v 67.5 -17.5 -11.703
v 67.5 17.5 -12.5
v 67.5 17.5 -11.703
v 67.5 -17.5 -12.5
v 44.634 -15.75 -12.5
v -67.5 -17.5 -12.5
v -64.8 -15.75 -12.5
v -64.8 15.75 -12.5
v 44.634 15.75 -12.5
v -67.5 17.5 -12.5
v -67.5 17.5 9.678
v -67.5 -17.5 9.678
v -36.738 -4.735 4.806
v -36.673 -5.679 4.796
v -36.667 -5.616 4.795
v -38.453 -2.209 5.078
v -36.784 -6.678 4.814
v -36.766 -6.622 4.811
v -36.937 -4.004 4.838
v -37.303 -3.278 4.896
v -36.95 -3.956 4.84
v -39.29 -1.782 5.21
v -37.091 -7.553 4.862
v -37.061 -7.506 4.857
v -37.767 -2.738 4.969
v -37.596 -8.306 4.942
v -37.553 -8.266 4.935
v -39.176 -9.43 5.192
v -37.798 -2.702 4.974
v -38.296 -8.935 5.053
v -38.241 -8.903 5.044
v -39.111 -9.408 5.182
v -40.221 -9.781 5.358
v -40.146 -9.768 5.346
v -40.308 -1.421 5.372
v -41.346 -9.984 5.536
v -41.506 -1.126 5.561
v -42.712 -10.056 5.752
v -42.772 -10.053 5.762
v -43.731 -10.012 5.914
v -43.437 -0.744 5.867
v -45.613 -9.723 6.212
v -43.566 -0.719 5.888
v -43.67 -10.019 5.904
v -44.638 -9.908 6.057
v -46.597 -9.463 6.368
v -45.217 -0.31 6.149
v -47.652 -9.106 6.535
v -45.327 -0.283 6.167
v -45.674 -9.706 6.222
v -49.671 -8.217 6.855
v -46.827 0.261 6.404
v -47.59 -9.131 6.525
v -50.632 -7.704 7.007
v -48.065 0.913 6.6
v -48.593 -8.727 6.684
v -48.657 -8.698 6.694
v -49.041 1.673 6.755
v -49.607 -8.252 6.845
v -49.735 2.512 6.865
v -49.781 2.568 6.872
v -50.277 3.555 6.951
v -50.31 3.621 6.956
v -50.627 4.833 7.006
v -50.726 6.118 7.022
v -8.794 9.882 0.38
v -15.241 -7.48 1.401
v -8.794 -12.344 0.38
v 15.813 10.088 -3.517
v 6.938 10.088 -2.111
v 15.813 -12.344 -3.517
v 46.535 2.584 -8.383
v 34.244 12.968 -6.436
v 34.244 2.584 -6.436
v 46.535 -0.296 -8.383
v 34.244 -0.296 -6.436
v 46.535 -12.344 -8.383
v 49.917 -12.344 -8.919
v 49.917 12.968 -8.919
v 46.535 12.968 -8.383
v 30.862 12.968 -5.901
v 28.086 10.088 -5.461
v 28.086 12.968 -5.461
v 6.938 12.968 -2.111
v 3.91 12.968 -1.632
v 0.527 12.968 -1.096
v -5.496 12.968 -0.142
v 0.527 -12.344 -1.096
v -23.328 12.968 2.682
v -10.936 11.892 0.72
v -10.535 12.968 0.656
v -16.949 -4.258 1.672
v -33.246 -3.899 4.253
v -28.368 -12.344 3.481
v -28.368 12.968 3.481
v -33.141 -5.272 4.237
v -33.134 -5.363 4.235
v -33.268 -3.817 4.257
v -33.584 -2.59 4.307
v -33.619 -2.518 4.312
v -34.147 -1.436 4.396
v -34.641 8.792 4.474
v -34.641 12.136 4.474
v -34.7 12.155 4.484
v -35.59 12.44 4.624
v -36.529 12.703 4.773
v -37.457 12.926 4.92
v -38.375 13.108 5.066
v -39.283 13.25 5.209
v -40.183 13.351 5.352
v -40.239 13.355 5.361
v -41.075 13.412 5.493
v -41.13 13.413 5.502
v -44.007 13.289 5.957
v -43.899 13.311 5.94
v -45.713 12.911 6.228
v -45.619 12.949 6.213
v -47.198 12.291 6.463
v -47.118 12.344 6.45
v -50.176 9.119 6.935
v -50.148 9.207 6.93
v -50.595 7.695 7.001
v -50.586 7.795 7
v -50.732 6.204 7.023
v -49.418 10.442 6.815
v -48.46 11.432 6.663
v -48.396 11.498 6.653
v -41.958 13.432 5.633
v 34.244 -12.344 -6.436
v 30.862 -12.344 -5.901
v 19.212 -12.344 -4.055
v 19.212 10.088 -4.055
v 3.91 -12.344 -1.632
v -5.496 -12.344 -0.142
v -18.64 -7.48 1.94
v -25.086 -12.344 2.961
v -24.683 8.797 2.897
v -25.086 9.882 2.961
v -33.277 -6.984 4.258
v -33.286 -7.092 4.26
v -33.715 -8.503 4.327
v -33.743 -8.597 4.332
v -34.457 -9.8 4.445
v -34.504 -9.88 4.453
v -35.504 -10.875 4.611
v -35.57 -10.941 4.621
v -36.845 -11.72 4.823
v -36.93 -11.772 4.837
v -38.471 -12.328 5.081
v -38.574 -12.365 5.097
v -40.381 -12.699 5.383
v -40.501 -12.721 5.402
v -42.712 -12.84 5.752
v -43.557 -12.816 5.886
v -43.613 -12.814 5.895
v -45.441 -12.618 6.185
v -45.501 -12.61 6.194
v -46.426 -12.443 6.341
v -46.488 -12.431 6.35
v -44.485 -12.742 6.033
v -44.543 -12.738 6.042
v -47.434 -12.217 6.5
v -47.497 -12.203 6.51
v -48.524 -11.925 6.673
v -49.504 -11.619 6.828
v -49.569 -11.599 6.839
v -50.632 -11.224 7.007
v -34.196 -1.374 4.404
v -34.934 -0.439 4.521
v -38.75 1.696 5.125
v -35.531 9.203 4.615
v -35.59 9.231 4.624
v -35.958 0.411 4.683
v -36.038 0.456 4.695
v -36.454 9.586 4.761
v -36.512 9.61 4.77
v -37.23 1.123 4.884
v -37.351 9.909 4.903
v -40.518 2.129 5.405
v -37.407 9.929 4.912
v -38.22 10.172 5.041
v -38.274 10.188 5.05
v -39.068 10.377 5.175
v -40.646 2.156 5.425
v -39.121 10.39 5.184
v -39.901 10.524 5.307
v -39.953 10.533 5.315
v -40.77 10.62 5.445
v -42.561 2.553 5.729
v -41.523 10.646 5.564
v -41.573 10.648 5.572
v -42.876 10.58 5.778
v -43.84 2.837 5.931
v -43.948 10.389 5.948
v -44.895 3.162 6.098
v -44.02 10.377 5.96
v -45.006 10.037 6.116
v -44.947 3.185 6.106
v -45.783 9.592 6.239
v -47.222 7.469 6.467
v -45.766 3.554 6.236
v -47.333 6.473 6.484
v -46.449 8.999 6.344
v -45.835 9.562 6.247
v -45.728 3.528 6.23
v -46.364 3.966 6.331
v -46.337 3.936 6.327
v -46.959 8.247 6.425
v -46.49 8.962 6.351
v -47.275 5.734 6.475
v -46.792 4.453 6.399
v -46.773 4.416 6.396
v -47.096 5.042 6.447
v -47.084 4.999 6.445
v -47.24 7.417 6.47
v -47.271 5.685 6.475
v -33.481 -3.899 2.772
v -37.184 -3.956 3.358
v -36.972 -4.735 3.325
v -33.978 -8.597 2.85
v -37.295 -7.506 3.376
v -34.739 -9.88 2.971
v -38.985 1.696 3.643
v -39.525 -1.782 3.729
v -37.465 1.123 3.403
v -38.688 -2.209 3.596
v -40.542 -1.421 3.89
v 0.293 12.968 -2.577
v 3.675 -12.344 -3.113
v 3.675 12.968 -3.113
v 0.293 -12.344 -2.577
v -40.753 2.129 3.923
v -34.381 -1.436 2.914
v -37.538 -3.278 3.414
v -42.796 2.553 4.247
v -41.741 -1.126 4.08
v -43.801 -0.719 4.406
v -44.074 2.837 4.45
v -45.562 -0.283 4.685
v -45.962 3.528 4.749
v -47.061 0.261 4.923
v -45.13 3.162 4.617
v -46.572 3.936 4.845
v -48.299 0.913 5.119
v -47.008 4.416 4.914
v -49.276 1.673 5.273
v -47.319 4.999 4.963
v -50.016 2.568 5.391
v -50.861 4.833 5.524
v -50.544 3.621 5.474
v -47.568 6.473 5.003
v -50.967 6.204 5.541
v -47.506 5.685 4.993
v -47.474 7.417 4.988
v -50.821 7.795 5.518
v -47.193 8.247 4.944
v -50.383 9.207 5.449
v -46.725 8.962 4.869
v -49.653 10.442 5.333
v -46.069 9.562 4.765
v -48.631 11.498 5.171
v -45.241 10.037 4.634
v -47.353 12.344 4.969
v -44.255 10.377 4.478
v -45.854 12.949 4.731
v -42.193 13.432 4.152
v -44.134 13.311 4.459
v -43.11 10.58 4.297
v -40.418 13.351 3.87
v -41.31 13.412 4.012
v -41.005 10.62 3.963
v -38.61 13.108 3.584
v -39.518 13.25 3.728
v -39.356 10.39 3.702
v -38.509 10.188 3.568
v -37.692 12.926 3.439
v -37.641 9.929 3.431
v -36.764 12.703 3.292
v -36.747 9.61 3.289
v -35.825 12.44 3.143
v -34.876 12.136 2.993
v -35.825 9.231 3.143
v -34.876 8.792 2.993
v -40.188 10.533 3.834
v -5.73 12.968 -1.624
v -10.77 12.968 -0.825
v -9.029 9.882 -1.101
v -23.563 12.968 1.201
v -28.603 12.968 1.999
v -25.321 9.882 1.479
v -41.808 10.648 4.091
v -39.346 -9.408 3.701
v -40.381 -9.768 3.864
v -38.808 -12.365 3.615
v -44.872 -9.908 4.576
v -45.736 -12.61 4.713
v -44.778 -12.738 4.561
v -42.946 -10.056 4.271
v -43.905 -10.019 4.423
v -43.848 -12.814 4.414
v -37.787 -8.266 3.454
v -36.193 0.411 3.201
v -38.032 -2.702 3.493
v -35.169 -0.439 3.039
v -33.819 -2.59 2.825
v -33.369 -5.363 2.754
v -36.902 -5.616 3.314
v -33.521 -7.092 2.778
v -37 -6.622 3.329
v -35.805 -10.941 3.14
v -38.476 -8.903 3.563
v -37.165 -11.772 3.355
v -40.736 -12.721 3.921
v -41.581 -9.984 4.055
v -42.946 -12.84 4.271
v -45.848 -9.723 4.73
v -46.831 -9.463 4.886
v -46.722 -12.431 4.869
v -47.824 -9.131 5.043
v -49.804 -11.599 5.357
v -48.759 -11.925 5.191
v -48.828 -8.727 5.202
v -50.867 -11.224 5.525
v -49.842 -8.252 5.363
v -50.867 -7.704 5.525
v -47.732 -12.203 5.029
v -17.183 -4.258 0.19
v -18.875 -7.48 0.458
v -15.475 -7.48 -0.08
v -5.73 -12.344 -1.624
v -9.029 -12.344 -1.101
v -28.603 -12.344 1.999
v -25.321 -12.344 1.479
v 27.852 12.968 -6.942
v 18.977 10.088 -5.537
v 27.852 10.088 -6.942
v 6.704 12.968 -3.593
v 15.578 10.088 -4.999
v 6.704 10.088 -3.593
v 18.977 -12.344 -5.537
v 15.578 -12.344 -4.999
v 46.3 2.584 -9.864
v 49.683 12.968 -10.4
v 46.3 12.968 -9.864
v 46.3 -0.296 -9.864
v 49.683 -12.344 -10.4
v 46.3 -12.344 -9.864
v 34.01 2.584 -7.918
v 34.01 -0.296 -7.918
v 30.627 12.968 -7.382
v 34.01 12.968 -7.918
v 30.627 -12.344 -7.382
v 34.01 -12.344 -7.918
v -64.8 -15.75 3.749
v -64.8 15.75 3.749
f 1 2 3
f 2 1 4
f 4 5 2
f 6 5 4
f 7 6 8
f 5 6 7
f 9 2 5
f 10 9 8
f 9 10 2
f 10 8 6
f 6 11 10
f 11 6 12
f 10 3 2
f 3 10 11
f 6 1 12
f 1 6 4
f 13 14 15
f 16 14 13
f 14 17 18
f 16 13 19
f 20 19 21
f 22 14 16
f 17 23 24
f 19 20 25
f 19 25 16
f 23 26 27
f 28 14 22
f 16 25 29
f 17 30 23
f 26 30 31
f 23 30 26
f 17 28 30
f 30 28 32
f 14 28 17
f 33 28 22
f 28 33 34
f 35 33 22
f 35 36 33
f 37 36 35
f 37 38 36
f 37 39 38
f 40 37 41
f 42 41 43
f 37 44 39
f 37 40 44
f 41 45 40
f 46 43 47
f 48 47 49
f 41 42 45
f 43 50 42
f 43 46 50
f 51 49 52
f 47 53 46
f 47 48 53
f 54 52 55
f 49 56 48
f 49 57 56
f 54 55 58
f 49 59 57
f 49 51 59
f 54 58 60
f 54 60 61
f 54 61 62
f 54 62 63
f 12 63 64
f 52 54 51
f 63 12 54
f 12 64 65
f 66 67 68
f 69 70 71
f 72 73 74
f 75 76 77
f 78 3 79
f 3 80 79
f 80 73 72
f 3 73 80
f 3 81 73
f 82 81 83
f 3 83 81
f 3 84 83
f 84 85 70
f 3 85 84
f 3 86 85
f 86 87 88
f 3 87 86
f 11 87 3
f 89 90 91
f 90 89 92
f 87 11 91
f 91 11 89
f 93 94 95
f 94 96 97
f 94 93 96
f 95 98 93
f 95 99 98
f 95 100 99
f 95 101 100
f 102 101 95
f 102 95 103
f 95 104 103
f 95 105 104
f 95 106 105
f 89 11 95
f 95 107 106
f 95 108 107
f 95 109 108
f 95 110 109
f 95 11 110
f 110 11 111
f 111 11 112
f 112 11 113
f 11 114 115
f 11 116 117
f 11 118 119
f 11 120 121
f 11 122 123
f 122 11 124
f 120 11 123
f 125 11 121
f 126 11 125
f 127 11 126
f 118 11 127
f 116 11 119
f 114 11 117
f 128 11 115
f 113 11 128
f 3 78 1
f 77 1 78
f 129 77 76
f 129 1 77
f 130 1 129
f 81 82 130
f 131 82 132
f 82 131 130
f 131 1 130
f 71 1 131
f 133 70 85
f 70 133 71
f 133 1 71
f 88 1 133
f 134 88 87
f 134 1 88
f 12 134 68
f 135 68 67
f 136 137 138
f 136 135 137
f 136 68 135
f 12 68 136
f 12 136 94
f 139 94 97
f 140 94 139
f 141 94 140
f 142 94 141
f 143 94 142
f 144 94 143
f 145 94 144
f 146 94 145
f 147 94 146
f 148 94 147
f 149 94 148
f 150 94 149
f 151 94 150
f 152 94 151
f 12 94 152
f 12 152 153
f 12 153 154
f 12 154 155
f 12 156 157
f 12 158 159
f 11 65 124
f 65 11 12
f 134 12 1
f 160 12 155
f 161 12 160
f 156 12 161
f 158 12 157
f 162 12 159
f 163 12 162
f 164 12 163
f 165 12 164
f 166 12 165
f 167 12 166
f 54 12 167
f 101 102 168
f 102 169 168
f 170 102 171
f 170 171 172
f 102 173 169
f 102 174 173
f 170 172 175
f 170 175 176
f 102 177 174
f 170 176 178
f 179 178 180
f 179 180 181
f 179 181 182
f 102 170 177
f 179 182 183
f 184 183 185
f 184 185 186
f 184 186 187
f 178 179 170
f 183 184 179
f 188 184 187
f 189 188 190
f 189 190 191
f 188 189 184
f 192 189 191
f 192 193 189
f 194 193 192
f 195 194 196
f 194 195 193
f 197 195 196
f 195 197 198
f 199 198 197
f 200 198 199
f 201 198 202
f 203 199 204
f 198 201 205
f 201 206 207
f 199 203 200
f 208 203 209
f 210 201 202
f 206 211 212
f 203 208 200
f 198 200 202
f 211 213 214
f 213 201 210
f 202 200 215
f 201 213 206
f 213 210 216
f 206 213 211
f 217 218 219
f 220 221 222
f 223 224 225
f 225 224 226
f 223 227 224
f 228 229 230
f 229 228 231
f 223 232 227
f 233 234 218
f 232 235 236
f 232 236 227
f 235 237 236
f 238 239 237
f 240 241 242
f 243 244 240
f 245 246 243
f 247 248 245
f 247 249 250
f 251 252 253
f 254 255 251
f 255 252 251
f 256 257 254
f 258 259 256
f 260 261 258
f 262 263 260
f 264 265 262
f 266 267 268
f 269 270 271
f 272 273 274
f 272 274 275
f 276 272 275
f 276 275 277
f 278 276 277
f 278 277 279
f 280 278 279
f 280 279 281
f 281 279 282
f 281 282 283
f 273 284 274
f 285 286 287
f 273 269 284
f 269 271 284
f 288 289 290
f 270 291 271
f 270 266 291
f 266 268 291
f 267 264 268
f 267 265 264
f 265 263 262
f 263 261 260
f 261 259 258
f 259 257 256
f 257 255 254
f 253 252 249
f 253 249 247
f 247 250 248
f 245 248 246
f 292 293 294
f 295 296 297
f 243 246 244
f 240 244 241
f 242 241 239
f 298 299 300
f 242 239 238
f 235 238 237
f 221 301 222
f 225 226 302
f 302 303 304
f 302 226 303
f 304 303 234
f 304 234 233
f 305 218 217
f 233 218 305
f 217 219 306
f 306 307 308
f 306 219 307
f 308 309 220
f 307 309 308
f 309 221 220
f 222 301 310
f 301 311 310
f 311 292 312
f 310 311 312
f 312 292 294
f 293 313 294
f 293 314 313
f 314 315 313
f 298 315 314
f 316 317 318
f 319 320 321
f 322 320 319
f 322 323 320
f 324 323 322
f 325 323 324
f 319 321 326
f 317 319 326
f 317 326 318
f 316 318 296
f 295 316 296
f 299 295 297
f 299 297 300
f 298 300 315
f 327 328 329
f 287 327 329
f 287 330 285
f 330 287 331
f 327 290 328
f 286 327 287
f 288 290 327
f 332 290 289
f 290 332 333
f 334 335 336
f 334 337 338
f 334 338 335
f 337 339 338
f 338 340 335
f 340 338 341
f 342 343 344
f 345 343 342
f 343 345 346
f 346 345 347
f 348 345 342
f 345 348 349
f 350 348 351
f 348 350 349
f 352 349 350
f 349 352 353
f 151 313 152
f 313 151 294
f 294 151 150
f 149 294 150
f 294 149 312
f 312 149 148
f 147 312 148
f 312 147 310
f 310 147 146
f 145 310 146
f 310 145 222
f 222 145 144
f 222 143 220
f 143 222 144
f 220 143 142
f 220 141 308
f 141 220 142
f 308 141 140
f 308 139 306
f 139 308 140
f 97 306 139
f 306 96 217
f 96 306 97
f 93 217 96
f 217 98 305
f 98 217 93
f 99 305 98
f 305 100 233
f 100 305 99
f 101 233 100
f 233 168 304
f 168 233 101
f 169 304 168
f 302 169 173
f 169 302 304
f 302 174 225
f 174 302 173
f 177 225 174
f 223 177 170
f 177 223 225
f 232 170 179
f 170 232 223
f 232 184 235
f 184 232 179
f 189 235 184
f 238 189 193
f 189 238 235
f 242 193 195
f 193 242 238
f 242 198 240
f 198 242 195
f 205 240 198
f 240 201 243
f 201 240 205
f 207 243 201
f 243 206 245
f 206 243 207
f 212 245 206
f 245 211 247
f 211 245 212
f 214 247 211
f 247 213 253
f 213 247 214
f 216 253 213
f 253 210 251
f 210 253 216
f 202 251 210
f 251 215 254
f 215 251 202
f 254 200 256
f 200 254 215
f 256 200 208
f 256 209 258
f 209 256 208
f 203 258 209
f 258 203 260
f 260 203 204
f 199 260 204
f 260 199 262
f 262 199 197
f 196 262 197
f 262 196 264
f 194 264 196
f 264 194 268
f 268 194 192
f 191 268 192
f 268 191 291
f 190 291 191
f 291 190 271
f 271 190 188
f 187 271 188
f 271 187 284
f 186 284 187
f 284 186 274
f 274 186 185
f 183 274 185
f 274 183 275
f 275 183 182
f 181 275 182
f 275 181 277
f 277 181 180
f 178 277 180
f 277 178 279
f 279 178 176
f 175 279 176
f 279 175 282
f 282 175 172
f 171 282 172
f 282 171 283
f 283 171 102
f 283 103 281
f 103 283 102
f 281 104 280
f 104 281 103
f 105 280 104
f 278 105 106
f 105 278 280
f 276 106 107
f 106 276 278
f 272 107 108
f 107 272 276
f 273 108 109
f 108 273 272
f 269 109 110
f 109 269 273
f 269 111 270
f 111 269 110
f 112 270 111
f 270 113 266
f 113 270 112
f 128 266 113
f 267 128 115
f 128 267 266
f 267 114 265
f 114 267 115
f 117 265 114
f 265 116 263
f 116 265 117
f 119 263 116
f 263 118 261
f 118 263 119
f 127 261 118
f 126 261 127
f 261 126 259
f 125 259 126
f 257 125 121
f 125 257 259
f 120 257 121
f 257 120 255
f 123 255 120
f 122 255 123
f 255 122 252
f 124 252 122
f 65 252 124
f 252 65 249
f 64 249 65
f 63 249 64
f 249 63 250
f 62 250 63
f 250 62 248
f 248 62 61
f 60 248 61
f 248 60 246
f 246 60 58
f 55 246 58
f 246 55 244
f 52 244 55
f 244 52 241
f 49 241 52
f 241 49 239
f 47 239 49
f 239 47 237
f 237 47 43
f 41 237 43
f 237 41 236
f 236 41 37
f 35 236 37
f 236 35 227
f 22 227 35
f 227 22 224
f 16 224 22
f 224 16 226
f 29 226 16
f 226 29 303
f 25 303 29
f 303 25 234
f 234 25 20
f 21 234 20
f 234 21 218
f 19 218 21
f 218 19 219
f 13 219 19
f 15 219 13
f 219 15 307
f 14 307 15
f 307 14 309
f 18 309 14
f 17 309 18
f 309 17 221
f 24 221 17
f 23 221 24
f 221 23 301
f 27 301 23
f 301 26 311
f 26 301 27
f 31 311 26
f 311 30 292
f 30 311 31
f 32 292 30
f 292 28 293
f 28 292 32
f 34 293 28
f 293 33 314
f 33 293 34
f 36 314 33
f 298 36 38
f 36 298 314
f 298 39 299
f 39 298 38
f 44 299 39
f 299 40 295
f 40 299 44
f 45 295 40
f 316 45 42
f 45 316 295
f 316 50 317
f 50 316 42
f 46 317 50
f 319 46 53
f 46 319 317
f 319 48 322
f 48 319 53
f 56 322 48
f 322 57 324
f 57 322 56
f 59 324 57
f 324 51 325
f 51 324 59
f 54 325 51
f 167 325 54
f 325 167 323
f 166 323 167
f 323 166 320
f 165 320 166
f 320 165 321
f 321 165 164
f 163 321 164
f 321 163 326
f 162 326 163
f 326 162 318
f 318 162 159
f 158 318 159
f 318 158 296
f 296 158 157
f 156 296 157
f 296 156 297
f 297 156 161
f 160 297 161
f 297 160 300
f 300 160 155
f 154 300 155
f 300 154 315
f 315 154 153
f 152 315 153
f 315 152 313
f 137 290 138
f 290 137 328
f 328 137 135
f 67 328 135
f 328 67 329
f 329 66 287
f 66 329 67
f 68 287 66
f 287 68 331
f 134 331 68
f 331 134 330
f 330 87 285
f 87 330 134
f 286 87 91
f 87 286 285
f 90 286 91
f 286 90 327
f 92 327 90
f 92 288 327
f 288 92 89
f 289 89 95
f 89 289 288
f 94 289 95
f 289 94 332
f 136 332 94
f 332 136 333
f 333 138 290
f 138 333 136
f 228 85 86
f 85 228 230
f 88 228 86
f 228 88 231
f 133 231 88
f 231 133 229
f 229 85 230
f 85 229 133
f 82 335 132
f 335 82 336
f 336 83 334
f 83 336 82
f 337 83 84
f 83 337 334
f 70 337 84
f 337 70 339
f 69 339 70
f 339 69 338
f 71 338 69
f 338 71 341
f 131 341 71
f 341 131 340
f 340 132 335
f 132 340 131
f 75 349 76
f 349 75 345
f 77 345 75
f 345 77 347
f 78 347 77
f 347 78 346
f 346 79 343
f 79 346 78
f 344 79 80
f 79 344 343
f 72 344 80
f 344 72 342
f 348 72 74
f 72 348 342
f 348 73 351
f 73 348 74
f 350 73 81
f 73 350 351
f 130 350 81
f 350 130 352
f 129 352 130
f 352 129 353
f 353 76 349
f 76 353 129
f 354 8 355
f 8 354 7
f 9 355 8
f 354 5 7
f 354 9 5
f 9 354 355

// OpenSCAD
text = "SMITH";
font = "Arial Black"; // [Arial, Baloo Paaji, Candal, Cinzel, Londrina Outline,Roboto]
// Default: 9
angle = 9; // [5:45]
// Default: 135
length = 135; // [0:1000]
// Default: 35
width = 35; // [0:1000]
// Default: 25
height = 25; // [0:1000]
// Default: 1.8
text_height = 1.6; // [0:0.1:100]
// Default: 25
text_size = 25; // [0:1000]
// Default: 0.1
wall_thickness = 0.1; // [0:0.1:1]
// ignore this variable!
thickness = 1-wall_thickness;
// Innie or Outie (text)
outie = "Innie"; // [Outie, Innie]

if (outie=="Outie") {
    //outie
    difference(){
        union() {
            difference(){
                cube([length,width,height],center=true);
                rotate([0,angle,0]) translate([0,0,(height/2)-1]) cube([length*2,width*2,height],center=true);
            }
            
            rotate([0,angle,0]) translate([0,0,-2]) linear_extrude(height=text_height) {
                text(text=text,font=font,size=text_size,halign="center",valign="center");
            }
        }
        
        //bottom
        scale([thickness+.06,thickness,thickness]) translate([0,0,-4.5]) difference(){
                cube([length,width,height],center=true);
                rotate([0,angle,0]) translate([0,0,(height/2)-2]) cube([length*2,width*2,height],center=true);
        }
    }
} else {
//innie
    difference(){
        difference() {
            difference(){
                cube([length,width,height],center=true);
                rotate([0,angle,0]) translate([0,0,(height/2)-1]) cube([length*2,width*2,height],center=true);
            }
            
            rotate([0,angle,0]) translate([0,0,-(0.9+text_height)]) linear_extrude(height=text_height) {
                text(text=text,font=font,size=text_size,halign="center",valign="center");
            }
        }
        
        //bottom
        scale([thickness+.06,thickness,thickness]) translate([0,0,-4.5]) difference(){
                cube([length,width,height],center=true);
                rotate([0,angle,0]) translate([0,0,(height/2)-2]) cube([length*2,width*2,height],center=true);
        }
    }
}
